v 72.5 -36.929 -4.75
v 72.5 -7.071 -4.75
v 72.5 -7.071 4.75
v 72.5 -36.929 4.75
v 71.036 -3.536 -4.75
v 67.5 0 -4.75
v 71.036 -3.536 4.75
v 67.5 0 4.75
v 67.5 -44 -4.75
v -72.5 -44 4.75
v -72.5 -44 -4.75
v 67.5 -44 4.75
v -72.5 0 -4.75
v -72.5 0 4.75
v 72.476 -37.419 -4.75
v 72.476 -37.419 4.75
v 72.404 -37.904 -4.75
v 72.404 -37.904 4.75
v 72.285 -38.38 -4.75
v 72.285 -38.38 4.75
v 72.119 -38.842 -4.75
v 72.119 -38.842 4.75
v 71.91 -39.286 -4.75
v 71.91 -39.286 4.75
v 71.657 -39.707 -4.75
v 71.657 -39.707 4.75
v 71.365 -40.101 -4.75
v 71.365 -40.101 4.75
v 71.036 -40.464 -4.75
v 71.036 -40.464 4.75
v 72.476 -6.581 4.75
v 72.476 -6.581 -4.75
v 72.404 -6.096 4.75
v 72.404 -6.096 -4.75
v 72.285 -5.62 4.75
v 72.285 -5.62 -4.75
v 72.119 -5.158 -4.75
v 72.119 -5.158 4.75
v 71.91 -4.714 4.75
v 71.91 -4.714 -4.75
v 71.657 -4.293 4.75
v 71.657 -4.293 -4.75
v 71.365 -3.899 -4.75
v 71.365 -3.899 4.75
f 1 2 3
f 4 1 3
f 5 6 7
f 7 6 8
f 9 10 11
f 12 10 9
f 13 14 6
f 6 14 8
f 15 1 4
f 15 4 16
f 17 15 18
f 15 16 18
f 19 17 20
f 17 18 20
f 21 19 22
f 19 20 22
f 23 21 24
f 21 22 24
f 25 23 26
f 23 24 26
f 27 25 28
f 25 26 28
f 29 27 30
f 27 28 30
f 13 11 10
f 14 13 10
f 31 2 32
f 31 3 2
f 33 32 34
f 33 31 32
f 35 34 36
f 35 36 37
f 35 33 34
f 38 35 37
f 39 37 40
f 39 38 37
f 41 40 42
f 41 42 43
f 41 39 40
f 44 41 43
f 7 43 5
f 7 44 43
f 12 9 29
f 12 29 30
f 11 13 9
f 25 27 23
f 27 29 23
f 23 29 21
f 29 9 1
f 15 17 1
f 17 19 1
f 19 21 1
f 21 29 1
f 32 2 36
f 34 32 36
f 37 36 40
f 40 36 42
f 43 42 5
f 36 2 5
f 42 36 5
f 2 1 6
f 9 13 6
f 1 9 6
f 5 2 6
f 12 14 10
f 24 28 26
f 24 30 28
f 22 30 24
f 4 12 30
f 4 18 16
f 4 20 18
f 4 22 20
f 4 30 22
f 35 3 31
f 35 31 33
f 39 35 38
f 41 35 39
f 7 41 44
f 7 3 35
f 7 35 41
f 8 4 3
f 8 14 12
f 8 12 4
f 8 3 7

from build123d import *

# Parameters (mm, degrees)
F0_W     = 145
F0_H     = 9.5
F1_DEPTH = 44
F2_SIZE  = 5
F3_R     = 5


with BuildPart() as f1:
    # F0 (on Front) → F1 (new body)
    with BuildSketch(Plane.XZ):
        Rectangle(F0_W, F0_H)
    extrude(amount=F1_DEPTH)

    # F2
    f2_edges = [f1.edges().sort_by_distance(p)[0] for p in [
        (72.5, -44, 0),
        (72.5, 0, 0),
    ]]
    chamfer(f2_edges, length=F2_SIZE)

    # F3
    f3_edges = [f1.edges().sort_by_distance(p)[0] for p in [
        (72.5, -39, 0),
        (72.5, -5, 0),
    ]]
    fillet(f3_edges, radius=F3_R)


solid = f1.part
